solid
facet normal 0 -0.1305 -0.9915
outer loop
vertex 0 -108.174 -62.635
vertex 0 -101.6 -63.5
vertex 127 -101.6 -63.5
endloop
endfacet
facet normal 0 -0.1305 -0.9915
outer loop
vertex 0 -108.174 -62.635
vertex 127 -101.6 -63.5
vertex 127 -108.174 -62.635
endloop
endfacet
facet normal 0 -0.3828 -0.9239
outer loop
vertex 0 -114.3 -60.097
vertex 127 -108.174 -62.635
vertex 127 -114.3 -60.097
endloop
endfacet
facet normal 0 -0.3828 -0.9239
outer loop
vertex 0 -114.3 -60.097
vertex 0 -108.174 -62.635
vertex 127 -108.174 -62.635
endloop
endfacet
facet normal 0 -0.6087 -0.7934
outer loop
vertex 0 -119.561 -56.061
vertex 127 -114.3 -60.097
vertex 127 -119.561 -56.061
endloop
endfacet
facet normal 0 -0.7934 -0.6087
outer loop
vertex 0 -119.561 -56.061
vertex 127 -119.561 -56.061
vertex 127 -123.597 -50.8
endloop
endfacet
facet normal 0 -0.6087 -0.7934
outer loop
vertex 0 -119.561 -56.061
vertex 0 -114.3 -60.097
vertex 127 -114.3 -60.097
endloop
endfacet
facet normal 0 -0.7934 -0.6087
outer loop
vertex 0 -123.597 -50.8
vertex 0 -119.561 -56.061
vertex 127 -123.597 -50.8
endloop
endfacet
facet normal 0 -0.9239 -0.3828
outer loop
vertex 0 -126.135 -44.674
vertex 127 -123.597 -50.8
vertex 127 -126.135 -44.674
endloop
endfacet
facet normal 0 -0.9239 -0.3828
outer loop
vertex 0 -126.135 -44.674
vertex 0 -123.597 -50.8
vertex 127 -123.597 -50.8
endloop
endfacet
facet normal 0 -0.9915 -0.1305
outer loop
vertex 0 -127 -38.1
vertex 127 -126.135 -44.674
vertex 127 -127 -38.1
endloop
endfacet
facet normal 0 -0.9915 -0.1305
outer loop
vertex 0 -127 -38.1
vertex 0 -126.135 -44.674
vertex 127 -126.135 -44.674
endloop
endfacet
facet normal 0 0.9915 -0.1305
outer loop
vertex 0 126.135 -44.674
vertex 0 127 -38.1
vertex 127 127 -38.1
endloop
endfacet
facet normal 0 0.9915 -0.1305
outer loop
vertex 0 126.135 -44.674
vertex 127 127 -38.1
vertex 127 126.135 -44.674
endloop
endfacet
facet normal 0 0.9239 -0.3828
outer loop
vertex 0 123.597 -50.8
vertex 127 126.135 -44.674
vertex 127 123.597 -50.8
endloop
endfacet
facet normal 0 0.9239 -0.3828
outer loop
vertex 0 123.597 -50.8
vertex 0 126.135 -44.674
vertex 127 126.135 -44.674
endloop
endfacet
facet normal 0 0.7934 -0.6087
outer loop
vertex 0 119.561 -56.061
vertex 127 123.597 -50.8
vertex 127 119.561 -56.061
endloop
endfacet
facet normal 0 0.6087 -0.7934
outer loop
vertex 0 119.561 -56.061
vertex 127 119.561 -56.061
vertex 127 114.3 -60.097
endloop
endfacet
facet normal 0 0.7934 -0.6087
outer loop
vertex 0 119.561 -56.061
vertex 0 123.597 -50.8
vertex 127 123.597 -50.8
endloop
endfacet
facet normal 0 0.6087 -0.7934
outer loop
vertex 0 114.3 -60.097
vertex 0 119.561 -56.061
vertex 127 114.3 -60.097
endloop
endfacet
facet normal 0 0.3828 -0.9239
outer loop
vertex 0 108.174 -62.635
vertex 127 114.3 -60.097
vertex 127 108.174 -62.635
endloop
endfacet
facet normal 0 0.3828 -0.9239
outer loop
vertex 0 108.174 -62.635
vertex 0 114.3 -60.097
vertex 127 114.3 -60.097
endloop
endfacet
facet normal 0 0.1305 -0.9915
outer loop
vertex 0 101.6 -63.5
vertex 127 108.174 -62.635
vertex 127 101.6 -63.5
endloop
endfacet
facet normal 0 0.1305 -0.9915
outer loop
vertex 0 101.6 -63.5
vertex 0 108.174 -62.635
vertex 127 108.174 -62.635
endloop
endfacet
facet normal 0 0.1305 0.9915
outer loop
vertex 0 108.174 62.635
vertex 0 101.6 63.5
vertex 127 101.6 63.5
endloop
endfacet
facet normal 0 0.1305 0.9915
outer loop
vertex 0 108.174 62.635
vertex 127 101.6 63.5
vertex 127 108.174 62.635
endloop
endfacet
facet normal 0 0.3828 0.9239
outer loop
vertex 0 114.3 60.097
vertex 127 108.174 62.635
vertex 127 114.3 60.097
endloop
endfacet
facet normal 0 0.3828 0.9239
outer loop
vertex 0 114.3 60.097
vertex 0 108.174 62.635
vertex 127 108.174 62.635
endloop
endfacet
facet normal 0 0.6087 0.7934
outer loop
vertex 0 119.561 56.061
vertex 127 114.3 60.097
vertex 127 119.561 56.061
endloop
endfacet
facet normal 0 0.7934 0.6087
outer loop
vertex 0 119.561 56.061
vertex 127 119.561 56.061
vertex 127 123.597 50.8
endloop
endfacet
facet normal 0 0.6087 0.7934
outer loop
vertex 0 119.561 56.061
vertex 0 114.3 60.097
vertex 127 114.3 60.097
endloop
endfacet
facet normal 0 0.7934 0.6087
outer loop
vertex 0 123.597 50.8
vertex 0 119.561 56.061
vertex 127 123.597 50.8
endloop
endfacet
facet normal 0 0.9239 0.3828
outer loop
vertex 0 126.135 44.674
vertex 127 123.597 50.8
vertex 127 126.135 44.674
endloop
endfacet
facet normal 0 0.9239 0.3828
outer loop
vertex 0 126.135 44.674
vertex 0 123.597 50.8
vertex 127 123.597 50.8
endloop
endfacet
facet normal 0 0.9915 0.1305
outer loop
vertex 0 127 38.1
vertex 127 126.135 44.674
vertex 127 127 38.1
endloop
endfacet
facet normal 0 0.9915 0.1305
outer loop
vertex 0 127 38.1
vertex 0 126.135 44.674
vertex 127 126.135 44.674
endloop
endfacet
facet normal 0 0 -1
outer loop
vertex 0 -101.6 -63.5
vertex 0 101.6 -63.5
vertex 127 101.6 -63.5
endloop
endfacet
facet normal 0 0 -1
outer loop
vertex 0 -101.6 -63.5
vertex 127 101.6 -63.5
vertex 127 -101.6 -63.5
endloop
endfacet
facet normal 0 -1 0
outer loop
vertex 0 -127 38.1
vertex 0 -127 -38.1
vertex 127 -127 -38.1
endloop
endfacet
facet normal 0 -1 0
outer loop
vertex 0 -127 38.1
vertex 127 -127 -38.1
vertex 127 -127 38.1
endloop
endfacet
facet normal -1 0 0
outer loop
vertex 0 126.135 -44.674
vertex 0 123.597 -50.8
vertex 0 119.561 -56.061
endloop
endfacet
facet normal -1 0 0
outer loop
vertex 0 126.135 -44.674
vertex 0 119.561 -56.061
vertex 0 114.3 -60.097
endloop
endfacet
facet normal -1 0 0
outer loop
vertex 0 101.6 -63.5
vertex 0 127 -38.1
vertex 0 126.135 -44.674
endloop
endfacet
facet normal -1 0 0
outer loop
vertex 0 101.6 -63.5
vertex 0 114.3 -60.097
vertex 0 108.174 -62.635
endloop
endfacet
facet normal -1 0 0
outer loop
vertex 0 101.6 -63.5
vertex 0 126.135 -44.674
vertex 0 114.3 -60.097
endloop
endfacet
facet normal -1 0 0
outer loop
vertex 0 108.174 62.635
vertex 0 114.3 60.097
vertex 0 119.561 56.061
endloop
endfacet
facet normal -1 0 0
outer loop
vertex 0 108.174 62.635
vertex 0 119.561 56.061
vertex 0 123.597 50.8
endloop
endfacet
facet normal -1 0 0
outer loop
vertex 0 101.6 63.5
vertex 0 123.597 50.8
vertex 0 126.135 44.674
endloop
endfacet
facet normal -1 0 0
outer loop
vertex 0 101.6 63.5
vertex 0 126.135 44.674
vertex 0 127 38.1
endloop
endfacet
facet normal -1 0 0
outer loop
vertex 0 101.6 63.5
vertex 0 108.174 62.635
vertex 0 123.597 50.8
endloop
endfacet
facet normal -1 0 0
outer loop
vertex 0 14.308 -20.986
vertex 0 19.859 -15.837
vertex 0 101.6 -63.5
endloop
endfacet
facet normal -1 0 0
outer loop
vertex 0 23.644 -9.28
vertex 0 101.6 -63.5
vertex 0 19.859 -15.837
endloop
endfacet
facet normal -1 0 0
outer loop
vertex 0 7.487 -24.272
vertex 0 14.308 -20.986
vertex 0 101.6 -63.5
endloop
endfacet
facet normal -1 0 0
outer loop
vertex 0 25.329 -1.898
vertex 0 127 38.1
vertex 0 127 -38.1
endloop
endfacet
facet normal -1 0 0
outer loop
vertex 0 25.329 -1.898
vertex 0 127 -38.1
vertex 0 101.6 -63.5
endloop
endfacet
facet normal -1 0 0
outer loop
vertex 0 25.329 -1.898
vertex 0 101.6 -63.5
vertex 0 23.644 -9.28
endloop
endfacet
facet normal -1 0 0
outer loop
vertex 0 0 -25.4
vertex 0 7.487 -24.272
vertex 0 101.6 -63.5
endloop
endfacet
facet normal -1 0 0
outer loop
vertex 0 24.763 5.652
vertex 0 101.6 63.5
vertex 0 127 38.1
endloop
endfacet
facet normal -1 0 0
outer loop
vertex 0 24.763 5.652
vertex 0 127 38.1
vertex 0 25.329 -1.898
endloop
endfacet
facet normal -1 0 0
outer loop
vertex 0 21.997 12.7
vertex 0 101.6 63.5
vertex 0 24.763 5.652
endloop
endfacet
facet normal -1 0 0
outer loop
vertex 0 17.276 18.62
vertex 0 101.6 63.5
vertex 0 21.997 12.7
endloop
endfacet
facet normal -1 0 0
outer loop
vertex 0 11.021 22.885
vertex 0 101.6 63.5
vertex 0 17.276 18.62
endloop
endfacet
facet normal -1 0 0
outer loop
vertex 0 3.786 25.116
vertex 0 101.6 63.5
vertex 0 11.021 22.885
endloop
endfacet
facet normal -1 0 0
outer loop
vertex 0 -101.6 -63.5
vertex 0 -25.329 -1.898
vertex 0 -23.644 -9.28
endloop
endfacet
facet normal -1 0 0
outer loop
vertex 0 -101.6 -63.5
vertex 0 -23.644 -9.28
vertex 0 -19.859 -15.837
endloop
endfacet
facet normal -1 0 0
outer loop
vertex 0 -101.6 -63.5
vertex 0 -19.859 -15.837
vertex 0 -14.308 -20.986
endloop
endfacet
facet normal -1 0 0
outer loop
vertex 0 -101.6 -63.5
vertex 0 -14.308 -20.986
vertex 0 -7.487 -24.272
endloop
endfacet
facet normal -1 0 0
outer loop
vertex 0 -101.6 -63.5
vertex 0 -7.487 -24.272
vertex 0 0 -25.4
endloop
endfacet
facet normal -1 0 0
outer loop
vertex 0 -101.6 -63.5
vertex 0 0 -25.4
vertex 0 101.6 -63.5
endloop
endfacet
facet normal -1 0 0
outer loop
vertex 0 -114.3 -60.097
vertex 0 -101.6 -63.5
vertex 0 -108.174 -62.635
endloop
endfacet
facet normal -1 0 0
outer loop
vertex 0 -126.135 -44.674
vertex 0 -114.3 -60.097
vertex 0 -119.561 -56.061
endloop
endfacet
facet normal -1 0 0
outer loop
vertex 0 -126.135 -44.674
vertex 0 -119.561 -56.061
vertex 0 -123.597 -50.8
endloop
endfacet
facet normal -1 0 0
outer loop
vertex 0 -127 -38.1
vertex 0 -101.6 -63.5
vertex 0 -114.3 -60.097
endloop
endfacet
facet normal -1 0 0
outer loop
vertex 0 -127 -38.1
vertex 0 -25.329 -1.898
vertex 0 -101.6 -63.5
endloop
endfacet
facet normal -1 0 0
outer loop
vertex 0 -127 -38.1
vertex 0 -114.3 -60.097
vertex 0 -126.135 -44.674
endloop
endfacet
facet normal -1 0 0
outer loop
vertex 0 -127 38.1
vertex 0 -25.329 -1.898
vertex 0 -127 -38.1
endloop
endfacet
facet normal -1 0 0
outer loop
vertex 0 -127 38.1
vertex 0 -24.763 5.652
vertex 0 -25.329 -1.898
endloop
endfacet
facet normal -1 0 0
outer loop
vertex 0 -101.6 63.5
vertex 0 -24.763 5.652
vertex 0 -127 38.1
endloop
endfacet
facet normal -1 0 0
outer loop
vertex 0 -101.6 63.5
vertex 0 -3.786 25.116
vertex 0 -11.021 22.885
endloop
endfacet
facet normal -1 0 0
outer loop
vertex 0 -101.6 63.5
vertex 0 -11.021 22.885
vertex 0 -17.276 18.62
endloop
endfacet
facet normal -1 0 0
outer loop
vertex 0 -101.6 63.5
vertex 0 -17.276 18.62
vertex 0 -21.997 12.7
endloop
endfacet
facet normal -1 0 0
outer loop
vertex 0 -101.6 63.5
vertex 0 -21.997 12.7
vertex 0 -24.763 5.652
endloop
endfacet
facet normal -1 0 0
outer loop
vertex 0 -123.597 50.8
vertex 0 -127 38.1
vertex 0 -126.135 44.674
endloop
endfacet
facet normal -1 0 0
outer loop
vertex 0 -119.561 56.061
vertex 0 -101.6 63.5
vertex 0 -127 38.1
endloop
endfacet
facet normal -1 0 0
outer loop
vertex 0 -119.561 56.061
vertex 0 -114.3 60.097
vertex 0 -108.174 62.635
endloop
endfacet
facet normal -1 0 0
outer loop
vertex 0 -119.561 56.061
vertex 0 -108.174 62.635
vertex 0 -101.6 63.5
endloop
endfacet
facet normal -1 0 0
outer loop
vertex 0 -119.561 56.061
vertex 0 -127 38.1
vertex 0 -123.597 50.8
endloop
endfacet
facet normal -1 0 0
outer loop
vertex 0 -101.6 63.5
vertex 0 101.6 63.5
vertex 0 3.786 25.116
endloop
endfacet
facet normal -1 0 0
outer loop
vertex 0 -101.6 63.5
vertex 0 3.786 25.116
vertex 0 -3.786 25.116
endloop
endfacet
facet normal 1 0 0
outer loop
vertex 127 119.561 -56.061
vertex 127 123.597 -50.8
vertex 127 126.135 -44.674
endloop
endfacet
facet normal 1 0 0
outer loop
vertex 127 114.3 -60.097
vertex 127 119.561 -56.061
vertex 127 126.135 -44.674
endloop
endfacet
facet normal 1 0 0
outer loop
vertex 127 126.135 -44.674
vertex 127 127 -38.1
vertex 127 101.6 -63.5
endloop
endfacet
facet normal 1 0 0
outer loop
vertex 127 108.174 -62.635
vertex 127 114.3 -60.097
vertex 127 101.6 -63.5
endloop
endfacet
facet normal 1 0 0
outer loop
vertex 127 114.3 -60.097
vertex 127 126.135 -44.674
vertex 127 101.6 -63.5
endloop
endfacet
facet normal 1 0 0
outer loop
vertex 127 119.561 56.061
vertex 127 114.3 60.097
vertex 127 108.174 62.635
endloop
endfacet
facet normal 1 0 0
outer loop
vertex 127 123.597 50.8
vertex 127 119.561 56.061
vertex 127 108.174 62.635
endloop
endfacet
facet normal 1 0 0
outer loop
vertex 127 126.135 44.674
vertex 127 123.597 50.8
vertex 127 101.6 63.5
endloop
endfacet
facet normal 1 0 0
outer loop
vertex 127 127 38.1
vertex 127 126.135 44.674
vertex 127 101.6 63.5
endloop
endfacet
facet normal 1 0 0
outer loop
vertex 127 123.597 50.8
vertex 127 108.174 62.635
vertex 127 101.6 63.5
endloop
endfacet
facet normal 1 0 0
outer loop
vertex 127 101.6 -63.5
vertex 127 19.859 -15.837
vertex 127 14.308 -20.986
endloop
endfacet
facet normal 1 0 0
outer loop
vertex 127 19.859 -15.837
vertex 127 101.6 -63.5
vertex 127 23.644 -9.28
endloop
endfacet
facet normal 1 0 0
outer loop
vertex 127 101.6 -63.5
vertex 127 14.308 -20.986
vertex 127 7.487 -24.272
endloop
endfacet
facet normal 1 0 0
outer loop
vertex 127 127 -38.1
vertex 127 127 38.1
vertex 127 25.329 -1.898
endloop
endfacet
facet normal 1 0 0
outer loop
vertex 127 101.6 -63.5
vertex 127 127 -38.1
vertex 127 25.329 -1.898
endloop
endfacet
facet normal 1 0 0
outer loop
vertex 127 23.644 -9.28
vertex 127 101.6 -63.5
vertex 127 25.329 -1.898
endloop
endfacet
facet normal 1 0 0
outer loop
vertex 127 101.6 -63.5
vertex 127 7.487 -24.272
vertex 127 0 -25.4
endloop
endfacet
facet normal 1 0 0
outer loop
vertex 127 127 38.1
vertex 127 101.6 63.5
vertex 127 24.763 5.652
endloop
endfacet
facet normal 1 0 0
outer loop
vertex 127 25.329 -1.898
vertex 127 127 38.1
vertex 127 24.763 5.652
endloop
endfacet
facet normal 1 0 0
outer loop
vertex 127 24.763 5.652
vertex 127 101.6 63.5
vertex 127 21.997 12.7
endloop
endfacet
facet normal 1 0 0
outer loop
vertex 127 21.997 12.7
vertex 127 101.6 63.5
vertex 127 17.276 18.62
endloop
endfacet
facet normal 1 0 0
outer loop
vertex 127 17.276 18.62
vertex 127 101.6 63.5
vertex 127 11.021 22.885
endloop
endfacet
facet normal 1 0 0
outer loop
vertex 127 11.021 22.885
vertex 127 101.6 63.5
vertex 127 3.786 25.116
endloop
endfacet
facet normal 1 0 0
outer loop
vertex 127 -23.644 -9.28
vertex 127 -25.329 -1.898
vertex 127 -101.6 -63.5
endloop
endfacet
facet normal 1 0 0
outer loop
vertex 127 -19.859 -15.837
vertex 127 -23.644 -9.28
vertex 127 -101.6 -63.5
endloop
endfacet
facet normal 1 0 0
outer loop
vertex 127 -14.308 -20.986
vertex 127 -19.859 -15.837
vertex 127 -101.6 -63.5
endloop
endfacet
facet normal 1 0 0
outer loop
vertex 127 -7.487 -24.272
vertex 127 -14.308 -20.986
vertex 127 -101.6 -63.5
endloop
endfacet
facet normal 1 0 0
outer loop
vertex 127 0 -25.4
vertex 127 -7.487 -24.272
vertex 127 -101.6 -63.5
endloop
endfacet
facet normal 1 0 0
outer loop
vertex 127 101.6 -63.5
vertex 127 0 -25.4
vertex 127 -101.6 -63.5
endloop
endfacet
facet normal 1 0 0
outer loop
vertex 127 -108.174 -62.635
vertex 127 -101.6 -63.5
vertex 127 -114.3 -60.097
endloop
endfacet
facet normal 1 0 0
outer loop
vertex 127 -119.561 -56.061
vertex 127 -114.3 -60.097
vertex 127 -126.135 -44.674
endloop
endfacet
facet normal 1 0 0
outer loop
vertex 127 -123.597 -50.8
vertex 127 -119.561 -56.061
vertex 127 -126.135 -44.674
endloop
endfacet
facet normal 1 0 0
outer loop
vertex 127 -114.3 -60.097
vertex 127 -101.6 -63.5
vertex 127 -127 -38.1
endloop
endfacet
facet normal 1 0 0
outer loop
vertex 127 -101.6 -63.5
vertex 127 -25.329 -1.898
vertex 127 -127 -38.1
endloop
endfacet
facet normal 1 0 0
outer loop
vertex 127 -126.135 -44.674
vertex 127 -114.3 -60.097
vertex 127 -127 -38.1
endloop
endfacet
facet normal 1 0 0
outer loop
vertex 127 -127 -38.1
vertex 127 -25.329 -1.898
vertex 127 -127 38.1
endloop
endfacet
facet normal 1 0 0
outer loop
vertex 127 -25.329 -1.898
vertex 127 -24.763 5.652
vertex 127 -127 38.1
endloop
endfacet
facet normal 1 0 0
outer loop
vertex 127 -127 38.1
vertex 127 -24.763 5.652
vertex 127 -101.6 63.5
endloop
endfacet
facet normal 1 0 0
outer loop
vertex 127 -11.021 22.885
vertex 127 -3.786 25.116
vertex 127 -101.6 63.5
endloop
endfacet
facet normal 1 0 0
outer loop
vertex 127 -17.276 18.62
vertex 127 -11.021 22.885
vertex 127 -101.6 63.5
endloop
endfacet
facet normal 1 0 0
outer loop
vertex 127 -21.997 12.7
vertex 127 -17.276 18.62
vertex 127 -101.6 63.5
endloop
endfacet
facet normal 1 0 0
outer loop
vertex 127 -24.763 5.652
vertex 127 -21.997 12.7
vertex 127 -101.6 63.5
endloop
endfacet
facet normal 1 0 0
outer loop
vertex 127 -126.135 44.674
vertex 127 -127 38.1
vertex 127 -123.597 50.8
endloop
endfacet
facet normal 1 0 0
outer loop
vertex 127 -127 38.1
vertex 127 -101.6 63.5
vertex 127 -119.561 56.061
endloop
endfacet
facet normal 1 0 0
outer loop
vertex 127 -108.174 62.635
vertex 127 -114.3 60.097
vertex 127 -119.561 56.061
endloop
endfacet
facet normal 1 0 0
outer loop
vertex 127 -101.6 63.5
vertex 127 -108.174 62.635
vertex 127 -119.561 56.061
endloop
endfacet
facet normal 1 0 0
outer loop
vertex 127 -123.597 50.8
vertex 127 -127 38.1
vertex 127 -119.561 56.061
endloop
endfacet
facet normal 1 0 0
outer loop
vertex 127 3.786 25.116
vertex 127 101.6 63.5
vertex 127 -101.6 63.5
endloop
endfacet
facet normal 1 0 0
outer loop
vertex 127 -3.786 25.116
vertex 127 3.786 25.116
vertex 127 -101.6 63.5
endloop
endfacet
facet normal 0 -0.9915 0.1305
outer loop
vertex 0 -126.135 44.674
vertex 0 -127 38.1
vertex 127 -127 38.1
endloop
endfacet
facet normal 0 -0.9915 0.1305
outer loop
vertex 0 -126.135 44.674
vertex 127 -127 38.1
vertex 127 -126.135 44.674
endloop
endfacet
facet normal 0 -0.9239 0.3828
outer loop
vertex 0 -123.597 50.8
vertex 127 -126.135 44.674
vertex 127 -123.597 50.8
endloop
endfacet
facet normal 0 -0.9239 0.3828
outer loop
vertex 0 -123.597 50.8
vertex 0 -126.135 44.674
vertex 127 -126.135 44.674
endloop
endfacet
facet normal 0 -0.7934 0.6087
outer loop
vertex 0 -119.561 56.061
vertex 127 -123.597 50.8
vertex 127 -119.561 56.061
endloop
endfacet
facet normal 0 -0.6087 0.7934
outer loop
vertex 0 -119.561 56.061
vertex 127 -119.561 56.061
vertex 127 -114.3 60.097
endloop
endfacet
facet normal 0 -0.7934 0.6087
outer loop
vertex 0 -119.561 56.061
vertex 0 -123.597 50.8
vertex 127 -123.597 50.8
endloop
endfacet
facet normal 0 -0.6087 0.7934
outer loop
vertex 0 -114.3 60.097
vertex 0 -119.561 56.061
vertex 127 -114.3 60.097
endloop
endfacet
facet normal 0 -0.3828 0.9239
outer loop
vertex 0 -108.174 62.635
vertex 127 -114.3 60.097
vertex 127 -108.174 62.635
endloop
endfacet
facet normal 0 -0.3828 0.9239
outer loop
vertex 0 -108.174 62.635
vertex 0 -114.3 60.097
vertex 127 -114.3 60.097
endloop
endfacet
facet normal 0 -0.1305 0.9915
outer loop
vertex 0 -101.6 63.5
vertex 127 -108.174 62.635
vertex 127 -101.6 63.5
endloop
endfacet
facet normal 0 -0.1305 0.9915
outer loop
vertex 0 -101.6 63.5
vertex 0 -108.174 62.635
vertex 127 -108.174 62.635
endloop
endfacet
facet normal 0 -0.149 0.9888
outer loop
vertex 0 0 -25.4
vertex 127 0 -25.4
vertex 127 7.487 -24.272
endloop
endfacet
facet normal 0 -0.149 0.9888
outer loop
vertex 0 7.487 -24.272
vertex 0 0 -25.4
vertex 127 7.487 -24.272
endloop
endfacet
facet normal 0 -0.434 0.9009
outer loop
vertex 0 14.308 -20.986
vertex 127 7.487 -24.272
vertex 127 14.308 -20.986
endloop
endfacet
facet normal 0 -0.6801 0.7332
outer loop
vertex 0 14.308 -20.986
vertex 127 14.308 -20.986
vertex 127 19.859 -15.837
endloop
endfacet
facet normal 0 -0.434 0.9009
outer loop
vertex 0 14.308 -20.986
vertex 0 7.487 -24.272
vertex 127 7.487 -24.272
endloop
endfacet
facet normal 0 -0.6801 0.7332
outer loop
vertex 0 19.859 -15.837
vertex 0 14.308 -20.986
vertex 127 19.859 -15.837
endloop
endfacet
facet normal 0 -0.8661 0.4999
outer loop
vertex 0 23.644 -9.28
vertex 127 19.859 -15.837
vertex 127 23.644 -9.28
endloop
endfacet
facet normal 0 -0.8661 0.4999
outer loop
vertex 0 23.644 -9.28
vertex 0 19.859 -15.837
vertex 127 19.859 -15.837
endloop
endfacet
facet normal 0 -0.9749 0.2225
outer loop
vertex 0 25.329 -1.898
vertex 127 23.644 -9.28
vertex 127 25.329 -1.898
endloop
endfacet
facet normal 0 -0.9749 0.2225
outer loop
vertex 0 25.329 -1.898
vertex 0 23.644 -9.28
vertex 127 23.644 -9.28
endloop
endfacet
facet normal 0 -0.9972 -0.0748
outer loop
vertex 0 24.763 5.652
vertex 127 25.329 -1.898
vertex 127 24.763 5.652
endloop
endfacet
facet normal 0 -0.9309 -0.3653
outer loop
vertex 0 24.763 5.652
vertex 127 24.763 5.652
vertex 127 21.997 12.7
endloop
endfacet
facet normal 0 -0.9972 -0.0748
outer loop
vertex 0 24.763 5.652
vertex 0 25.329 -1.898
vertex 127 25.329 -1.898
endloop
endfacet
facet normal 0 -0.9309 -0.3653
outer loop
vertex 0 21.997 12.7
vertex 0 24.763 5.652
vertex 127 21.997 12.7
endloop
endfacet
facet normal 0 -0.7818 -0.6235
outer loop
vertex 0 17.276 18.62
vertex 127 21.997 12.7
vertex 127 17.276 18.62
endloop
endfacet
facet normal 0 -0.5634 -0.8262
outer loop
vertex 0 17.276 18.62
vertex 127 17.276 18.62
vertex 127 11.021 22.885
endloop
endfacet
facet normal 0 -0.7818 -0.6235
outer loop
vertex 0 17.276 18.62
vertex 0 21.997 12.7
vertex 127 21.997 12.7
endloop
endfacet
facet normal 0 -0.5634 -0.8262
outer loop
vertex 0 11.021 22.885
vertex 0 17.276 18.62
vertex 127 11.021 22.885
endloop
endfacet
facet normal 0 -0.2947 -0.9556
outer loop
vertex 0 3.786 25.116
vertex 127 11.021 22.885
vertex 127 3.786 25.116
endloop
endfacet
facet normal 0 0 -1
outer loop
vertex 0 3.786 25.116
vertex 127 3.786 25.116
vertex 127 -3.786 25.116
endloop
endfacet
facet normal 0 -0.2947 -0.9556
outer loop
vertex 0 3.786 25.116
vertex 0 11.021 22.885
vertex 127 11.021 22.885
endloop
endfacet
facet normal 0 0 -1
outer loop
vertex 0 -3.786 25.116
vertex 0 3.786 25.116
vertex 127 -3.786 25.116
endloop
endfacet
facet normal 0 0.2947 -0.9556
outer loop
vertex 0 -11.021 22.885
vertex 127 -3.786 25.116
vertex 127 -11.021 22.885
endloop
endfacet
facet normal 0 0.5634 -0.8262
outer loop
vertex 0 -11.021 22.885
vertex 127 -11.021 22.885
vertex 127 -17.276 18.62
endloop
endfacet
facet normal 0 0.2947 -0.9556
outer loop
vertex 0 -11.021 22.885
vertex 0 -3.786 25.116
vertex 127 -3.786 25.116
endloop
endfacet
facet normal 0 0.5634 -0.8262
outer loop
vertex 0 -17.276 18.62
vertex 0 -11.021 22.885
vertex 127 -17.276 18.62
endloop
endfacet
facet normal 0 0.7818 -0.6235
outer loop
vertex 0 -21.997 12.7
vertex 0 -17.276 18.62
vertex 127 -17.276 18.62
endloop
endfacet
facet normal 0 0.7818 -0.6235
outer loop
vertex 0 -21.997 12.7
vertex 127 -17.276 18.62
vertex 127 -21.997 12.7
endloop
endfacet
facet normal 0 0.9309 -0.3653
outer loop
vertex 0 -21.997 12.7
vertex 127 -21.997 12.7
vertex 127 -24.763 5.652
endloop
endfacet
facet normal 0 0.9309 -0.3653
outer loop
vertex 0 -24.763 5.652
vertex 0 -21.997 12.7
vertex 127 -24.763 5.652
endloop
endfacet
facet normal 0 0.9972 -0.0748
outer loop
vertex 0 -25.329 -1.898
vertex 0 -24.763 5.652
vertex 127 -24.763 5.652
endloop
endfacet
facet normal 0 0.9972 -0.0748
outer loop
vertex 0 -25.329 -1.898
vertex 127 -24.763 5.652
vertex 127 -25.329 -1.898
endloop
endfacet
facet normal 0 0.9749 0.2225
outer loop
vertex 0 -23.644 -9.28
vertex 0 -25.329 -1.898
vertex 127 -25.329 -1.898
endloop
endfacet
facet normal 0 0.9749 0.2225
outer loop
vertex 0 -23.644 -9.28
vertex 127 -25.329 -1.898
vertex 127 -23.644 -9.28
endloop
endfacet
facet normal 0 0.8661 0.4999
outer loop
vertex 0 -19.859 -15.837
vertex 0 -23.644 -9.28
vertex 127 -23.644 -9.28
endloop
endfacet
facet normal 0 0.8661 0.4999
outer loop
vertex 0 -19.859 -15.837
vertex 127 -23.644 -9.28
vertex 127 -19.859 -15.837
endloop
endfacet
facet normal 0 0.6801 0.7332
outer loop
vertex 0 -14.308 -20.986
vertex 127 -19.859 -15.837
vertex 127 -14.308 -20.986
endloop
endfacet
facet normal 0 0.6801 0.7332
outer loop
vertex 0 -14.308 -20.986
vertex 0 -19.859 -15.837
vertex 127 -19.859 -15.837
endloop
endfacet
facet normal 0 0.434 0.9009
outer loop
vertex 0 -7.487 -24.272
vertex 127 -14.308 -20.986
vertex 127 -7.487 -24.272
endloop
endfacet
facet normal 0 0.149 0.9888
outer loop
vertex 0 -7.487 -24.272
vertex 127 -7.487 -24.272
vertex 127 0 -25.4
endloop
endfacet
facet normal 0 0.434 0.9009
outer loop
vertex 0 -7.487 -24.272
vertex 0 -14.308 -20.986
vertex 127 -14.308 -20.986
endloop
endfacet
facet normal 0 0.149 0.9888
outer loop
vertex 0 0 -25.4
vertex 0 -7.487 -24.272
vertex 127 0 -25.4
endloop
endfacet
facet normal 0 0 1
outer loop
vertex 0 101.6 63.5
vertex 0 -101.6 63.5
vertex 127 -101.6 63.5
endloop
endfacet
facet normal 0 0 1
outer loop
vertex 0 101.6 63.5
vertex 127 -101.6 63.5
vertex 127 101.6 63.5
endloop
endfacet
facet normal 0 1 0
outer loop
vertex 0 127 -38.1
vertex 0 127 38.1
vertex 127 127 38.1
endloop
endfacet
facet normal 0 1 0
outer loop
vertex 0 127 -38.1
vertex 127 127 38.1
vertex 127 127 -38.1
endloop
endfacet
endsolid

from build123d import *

# Parameters (mm, degrees)
CROQUIS2_R              = 25.4
SALIENTE_EXTRUIR1_DEPTH = 127


with BuildPart() as part:
    # Croquis2 → Saliente-Extruir1 (new body)
    with BuildSketch(Plane.YZ):
        with BuildLine():
            Line((-101.6, 63.5), (101.6, 63.5))
            ThreePointArc((101.6, 63.5), (119.560512242, 56.060512242), (127, 38.1))
            Line((127, 38.1), (127, -38.1))
            ThreePointArc((127, -38.1), (119.560512242, -56.060512242), (101.6, -63.5))
            Line((101.6, -63.5), (-101.6, -63.5))
            ThreePointArc((-101.6, -63.5), (-119.560512242, -56.060512242), (-127, -38.1))
            Line((-127, -38.1), (-127, 38.1))
            ThreePointArc((-127, 38.1), (-119.560512242, 56.060512242), (-101.6, 63.5))
        make_face()
        with Locations(Location((0, 0, 0), (0, 0, 270))):
            Circle(CROQUIS2_R, mode=Mode.SUBTRACT)
    extrude(amount=SALIENTE_EXTRUIR1_DEPTH)


solid = part.part
